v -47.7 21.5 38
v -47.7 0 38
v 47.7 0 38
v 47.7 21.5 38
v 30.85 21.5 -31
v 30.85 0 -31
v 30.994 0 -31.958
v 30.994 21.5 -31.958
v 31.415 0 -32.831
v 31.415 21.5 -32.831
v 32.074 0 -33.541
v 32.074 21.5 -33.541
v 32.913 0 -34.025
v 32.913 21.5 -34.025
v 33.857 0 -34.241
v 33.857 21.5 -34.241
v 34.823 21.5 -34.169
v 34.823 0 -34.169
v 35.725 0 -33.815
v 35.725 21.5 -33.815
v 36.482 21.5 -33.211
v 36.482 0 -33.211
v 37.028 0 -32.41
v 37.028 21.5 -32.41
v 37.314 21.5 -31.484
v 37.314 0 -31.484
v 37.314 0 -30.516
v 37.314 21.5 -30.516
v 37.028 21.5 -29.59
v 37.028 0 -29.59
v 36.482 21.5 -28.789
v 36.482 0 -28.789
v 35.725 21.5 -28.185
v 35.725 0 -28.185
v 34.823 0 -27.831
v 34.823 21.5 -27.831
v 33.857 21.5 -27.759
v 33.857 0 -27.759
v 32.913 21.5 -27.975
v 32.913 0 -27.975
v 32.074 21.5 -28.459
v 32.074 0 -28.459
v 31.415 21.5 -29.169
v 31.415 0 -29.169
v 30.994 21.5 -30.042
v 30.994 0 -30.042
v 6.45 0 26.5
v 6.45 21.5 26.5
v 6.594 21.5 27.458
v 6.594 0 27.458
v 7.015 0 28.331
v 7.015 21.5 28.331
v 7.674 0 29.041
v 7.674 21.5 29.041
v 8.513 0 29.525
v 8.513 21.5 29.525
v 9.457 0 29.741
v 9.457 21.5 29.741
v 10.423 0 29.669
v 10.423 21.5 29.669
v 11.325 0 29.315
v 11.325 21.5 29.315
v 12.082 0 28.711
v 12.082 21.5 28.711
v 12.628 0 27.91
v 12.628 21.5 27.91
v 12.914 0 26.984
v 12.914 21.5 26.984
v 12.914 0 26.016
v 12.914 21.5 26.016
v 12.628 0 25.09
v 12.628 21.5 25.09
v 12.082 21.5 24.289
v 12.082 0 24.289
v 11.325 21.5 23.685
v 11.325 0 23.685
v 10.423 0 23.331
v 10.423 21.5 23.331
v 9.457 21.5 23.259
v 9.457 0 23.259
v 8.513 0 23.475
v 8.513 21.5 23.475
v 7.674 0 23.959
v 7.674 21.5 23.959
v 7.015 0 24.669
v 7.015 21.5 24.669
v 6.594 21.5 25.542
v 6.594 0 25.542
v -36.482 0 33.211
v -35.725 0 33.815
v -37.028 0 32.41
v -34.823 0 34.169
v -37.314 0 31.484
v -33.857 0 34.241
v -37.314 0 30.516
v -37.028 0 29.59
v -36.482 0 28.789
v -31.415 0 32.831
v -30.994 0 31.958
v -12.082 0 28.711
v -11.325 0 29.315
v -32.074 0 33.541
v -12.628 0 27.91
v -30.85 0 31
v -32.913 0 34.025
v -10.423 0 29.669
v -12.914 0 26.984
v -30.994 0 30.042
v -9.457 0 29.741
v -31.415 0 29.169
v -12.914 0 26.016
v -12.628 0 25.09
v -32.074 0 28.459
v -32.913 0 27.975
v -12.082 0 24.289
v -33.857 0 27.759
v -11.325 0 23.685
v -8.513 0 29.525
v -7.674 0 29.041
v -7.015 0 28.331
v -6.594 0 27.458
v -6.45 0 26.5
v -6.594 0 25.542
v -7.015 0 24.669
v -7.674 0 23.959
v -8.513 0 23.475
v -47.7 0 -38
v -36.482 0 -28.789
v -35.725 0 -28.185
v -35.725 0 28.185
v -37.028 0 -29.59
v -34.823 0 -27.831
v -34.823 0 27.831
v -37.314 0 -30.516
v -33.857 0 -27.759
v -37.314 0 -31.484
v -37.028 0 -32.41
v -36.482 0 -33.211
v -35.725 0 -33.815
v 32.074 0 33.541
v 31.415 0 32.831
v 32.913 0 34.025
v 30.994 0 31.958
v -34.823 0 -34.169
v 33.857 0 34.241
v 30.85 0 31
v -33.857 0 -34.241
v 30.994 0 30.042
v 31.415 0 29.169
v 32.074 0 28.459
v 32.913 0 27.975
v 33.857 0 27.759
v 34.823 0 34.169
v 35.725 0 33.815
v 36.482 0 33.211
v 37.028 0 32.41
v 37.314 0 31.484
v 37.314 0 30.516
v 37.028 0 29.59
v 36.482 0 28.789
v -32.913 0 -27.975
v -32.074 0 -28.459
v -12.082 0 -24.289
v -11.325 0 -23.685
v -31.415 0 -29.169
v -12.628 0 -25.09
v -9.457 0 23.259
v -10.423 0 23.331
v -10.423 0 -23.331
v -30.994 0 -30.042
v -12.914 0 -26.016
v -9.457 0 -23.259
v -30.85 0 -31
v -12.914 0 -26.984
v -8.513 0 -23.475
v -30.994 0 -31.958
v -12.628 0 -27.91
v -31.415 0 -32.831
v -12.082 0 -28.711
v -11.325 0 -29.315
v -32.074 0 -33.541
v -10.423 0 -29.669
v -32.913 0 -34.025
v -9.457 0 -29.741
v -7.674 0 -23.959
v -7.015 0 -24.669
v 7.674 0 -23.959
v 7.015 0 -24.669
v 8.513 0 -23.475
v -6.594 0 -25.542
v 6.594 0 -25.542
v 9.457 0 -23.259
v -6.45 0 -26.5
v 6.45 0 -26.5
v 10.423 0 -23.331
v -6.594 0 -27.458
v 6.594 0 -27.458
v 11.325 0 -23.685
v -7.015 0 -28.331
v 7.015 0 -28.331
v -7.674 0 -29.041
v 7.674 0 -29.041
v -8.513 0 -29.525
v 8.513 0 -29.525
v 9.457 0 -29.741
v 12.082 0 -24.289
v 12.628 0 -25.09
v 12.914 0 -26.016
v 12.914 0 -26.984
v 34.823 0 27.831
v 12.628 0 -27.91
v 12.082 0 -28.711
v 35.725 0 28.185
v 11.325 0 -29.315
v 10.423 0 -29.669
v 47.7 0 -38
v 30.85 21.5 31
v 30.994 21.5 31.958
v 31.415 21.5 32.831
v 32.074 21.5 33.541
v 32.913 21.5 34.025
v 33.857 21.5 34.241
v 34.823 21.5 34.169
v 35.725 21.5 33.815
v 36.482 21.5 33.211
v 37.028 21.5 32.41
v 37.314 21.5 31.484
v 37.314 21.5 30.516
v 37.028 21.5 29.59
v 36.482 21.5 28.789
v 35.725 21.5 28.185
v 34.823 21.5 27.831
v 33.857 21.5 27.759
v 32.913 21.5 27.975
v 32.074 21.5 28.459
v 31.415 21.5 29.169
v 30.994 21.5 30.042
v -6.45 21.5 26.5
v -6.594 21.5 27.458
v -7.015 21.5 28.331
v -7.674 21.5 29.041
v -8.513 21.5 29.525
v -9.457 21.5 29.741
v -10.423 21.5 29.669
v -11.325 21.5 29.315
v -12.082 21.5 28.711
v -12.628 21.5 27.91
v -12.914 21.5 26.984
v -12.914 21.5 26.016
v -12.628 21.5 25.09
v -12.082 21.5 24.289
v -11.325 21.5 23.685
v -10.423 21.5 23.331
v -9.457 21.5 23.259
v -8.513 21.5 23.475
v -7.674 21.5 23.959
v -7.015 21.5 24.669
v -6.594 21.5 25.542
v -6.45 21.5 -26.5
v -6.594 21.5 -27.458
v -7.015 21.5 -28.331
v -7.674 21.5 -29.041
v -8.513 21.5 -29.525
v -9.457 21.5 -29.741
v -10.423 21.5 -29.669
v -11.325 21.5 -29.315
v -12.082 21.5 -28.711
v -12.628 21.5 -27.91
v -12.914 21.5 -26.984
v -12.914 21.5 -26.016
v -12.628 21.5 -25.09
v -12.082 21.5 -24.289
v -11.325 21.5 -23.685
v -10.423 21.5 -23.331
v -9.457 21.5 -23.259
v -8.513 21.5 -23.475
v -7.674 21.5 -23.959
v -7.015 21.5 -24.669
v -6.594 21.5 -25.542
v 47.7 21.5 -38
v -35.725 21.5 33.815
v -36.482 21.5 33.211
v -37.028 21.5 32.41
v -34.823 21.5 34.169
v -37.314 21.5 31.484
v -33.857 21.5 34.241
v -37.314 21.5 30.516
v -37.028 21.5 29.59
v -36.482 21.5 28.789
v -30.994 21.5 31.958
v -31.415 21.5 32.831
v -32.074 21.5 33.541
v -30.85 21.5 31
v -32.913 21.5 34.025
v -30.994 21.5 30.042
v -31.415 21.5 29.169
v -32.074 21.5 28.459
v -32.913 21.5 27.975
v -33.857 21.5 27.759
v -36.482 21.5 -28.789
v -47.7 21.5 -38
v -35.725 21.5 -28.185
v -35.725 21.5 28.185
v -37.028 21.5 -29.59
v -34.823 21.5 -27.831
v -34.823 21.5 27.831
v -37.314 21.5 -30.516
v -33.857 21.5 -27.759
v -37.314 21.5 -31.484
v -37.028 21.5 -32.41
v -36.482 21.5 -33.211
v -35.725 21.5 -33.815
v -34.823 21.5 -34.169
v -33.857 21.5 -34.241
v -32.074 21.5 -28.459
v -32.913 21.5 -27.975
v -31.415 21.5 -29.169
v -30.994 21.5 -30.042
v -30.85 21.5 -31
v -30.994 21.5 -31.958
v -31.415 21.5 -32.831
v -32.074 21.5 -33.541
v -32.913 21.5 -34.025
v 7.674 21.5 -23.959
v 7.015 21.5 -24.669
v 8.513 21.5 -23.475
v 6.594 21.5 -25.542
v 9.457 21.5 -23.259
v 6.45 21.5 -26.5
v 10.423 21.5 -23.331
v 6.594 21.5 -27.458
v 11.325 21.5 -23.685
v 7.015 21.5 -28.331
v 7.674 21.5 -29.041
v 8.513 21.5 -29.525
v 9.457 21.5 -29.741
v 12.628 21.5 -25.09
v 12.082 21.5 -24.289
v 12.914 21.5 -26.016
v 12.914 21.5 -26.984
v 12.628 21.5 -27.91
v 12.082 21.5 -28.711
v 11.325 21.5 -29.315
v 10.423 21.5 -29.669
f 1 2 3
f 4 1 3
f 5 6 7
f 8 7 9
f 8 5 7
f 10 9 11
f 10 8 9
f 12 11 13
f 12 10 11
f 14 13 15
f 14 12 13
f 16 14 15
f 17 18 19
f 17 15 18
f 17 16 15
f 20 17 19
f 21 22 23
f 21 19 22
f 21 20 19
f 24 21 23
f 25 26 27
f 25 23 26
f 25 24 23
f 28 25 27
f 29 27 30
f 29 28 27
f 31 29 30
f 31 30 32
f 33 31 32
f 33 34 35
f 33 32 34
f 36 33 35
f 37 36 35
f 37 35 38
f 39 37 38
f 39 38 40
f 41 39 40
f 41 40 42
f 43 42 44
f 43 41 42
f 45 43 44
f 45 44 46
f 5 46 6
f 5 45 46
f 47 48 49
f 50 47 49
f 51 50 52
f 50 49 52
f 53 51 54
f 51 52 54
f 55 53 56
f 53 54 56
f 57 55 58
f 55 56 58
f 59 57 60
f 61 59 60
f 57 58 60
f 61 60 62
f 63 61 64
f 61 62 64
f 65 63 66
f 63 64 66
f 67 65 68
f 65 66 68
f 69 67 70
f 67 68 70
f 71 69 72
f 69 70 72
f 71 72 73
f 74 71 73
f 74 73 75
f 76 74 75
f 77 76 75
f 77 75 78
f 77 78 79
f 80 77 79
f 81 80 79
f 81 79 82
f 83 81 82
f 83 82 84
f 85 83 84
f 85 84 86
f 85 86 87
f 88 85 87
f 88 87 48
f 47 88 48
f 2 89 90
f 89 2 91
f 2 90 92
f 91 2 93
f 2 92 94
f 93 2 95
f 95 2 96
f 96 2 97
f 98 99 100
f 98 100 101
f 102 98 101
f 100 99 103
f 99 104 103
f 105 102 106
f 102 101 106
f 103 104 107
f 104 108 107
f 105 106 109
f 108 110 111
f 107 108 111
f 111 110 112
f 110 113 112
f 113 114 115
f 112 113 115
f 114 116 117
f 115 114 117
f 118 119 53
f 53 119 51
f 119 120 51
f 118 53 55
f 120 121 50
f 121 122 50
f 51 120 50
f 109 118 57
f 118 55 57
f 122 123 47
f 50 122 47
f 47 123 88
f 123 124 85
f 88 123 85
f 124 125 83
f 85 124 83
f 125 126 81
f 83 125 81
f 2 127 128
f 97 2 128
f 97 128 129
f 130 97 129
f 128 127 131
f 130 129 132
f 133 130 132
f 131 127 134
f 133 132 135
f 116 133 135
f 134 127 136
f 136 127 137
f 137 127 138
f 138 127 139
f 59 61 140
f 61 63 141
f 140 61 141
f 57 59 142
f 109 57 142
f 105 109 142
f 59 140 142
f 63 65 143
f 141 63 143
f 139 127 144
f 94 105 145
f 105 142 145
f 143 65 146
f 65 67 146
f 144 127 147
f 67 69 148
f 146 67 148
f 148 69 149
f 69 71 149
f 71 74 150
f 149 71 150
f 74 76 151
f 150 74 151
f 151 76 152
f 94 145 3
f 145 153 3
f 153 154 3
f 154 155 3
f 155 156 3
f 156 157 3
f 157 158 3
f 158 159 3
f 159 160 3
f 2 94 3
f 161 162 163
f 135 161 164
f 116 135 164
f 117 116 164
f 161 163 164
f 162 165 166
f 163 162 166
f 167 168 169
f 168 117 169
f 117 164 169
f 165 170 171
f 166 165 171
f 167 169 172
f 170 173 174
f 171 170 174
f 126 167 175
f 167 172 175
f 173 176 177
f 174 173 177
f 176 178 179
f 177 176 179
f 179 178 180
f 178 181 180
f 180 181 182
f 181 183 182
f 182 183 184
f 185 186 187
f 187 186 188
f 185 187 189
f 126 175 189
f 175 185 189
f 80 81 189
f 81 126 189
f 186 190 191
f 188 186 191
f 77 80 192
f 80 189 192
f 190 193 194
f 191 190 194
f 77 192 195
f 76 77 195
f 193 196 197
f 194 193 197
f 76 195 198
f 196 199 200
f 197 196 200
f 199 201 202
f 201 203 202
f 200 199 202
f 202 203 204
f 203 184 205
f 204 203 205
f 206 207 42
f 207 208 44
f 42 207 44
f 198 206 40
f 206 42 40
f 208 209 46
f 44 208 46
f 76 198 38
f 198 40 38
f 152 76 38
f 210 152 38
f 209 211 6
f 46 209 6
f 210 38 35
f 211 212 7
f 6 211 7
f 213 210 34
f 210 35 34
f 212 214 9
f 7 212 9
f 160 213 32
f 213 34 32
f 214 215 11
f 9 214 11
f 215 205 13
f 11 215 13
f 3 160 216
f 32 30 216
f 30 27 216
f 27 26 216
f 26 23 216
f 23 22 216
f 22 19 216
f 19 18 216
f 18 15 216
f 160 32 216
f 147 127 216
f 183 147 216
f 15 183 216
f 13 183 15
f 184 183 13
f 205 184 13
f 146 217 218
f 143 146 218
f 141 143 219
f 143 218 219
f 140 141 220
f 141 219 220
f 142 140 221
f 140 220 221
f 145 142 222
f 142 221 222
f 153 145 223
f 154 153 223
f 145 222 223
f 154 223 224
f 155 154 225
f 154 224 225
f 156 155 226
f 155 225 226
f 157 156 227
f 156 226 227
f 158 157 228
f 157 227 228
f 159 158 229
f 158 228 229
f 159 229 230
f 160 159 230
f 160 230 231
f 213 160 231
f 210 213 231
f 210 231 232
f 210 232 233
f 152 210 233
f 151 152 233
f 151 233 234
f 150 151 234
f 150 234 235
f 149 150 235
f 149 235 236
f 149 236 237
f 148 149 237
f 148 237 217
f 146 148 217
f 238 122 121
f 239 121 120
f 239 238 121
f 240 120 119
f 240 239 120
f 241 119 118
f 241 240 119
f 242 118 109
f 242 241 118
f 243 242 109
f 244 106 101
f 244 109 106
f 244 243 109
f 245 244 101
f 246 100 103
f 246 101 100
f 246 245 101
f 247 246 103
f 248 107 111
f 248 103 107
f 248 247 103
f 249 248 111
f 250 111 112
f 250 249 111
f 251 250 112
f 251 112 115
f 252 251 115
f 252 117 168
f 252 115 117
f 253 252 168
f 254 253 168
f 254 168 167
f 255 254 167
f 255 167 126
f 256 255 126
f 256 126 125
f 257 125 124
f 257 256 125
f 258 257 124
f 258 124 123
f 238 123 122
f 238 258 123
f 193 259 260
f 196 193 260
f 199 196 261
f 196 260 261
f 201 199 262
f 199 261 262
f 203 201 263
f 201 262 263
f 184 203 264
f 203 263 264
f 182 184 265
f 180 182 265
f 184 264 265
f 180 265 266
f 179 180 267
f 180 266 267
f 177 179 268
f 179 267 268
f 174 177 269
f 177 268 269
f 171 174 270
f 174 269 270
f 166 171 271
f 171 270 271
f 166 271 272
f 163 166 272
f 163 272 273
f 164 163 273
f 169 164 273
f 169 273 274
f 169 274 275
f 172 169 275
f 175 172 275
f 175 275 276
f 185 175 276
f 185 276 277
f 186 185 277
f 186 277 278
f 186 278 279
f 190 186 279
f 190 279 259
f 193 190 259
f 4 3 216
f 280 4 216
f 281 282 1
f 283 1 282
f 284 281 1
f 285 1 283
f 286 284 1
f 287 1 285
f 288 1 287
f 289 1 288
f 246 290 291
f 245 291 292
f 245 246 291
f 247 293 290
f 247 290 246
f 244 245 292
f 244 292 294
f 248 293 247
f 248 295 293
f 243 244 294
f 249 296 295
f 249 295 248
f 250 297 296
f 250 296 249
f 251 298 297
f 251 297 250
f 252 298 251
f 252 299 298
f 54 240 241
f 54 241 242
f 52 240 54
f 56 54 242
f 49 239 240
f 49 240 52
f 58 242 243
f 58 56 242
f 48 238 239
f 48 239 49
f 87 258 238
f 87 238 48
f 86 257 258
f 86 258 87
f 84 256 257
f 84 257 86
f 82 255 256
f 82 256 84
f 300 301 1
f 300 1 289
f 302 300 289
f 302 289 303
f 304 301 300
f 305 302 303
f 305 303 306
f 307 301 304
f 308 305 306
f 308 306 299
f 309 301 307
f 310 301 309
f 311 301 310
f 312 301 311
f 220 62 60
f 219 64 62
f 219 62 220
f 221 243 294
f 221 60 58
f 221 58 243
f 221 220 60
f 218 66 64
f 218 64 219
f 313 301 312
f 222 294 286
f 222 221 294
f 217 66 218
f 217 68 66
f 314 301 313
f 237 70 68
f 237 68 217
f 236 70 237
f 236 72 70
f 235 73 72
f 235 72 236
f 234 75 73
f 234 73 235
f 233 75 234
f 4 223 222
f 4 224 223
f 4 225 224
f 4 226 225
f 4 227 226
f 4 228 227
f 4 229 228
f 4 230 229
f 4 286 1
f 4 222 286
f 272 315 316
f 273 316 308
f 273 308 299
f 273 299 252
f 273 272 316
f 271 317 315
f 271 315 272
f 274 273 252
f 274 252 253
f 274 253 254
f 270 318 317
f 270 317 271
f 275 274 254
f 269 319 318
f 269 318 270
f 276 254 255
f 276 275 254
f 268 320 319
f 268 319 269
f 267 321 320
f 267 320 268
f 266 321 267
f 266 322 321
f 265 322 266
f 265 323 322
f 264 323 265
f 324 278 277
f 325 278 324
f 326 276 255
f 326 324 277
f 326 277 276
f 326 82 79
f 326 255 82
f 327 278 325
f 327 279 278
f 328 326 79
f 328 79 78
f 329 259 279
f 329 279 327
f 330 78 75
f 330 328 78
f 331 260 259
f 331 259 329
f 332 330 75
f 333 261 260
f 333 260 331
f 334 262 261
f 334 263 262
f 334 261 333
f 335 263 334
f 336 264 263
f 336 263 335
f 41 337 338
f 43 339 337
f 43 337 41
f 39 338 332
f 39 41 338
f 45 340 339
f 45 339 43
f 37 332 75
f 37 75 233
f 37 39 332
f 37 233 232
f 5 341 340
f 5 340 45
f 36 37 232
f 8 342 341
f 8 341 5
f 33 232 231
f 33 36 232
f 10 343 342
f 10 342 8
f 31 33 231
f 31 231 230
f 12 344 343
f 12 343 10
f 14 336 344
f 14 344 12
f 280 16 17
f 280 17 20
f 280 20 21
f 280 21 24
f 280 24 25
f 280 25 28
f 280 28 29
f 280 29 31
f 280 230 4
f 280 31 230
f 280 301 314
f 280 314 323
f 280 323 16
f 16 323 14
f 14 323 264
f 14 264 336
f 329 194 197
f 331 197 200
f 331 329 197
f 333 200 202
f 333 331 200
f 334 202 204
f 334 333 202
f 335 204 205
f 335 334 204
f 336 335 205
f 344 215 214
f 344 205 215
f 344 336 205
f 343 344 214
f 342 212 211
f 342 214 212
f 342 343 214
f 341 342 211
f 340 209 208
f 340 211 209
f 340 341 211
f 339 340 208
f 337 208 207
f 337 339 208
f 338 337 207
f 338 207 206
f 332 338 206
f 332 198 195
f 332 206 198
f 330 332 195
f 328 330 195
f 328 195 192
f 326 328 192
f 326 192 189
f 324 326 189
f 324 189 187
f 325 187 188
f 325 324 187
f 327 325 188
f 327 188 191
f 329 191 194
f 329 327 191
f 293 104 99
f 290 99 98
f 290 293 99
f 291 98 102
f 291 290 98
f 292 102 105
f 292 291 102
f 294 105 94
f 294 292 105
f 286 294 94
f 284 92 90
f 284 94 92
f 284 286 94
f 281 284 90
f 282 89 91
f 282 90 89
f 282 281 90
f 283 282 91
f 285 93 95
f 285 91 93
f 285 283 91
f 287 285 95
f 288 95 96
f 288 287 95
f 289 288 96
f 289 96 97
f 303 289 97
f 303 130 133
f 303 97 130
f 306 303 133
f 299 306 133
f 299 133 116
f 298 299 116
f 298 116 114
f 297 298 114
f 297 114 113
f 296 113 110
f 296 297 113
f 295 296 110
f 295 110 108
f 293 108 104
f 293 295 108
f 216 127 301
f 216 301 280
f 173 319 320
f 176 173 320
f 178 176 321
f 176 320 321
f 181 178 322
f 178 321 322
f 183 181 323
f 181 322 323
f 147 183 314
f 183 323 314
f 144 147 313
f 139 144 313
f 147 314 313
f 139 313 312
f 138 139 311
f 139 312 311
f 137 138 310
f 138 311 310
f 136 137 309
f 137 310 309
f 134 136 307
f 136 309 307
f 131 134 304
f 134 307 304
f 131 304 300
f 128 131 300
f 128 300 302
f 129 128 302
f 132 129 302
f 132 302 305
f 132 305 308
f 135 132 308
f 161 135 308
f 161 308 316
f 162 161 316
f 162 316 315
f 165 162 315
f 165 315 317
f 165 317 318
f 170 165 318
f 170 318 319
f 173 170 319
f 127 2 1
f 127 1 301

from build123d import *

# Parameters (mm, degrees)
SKETCH1_W                                  = 95.4
SKETCH1_H                                  = 76
BOSS_EXTRUDE1_DEPTH                        = 21.5
SKETCH2_R                                  = 3.25
CUT_EXTRUDE1_DEPTH                         = 22.5
MIRROR1_AT_THE_SECOND_PLANE_COPY_1_SKETC_R = 3.25
MIRROR1_AT_THE_SECOND_PLANE_COPY_1_DEPTH   = 22.5


with BuildPart() as part:
    # Sketch1 → Boss-Extrude1 (new body)
    with BuildSketch(Plane(origin=(0, 0, 0), x_dir=(1, 0, 0), z_dir=(0, 1, 0))):
        Rectangle(SKETCH1_W, SKETCH1_H)
    extrude(amount=BOSS_EXTRUDE1_DEPTH)

    # Sketch2 → Cut-Extrude1 (cut, through all)
    with BuildSketch(Plane(origin=(0, 21.5, 0), x_dir=(1, 0, 0), z_dir=(0, 1, 0))):
        with Locations((-34.1, 31)):
            Circle(SKETCH2_R)
        with Locations((-9.7, 26.5)):
            Circle(SKETCH2_R)
    cut_extrude1 = extrude(amount=-CUT_EXTRUDE1_DEPTH, mode=Mode.SUBTRACT)

    # Mirror1: Cut-Extrude1 across plane
    add(cut_extrude1.mirror(Plane(origin=(0, 0, 0), x_dir=(0, 0, 1), z_dir=(1, 0, 0))), mode=Mode.SUBTRACT)

    # Mirror1 at the second plane: Cut-Extrude1 across plane
    add(cut_extrude1.mirror(Plane.XY), mode=Mode.SUBTRACT)

    # Mirror1 at the second plane copy 1 sketc → Mirror1 at the second plane copy 1 (cut, through all)
    with BuildSketch(Plane(origin=(0, 21.5, 0), x_dir=(-1, 0, 0), z_dir=(0, 1, 0))):
        with Locations((-34.1, 31)):
            Circle(MIRROR1_AT_THE_SECOND_PLANE_COPY_1_SKETC_R)
        with Locations((-9.7, 26.5)):
            Circle(MIRROR1_AT_THE_SECOND_PLANE_COPY_1_SKETC_R)
    extrude(amount=-MIRROR1_AT_THE_SECOND_PLANE_COPY_1_DEPTH, mode=Mode.SUBTRACT)


solid = part.part
